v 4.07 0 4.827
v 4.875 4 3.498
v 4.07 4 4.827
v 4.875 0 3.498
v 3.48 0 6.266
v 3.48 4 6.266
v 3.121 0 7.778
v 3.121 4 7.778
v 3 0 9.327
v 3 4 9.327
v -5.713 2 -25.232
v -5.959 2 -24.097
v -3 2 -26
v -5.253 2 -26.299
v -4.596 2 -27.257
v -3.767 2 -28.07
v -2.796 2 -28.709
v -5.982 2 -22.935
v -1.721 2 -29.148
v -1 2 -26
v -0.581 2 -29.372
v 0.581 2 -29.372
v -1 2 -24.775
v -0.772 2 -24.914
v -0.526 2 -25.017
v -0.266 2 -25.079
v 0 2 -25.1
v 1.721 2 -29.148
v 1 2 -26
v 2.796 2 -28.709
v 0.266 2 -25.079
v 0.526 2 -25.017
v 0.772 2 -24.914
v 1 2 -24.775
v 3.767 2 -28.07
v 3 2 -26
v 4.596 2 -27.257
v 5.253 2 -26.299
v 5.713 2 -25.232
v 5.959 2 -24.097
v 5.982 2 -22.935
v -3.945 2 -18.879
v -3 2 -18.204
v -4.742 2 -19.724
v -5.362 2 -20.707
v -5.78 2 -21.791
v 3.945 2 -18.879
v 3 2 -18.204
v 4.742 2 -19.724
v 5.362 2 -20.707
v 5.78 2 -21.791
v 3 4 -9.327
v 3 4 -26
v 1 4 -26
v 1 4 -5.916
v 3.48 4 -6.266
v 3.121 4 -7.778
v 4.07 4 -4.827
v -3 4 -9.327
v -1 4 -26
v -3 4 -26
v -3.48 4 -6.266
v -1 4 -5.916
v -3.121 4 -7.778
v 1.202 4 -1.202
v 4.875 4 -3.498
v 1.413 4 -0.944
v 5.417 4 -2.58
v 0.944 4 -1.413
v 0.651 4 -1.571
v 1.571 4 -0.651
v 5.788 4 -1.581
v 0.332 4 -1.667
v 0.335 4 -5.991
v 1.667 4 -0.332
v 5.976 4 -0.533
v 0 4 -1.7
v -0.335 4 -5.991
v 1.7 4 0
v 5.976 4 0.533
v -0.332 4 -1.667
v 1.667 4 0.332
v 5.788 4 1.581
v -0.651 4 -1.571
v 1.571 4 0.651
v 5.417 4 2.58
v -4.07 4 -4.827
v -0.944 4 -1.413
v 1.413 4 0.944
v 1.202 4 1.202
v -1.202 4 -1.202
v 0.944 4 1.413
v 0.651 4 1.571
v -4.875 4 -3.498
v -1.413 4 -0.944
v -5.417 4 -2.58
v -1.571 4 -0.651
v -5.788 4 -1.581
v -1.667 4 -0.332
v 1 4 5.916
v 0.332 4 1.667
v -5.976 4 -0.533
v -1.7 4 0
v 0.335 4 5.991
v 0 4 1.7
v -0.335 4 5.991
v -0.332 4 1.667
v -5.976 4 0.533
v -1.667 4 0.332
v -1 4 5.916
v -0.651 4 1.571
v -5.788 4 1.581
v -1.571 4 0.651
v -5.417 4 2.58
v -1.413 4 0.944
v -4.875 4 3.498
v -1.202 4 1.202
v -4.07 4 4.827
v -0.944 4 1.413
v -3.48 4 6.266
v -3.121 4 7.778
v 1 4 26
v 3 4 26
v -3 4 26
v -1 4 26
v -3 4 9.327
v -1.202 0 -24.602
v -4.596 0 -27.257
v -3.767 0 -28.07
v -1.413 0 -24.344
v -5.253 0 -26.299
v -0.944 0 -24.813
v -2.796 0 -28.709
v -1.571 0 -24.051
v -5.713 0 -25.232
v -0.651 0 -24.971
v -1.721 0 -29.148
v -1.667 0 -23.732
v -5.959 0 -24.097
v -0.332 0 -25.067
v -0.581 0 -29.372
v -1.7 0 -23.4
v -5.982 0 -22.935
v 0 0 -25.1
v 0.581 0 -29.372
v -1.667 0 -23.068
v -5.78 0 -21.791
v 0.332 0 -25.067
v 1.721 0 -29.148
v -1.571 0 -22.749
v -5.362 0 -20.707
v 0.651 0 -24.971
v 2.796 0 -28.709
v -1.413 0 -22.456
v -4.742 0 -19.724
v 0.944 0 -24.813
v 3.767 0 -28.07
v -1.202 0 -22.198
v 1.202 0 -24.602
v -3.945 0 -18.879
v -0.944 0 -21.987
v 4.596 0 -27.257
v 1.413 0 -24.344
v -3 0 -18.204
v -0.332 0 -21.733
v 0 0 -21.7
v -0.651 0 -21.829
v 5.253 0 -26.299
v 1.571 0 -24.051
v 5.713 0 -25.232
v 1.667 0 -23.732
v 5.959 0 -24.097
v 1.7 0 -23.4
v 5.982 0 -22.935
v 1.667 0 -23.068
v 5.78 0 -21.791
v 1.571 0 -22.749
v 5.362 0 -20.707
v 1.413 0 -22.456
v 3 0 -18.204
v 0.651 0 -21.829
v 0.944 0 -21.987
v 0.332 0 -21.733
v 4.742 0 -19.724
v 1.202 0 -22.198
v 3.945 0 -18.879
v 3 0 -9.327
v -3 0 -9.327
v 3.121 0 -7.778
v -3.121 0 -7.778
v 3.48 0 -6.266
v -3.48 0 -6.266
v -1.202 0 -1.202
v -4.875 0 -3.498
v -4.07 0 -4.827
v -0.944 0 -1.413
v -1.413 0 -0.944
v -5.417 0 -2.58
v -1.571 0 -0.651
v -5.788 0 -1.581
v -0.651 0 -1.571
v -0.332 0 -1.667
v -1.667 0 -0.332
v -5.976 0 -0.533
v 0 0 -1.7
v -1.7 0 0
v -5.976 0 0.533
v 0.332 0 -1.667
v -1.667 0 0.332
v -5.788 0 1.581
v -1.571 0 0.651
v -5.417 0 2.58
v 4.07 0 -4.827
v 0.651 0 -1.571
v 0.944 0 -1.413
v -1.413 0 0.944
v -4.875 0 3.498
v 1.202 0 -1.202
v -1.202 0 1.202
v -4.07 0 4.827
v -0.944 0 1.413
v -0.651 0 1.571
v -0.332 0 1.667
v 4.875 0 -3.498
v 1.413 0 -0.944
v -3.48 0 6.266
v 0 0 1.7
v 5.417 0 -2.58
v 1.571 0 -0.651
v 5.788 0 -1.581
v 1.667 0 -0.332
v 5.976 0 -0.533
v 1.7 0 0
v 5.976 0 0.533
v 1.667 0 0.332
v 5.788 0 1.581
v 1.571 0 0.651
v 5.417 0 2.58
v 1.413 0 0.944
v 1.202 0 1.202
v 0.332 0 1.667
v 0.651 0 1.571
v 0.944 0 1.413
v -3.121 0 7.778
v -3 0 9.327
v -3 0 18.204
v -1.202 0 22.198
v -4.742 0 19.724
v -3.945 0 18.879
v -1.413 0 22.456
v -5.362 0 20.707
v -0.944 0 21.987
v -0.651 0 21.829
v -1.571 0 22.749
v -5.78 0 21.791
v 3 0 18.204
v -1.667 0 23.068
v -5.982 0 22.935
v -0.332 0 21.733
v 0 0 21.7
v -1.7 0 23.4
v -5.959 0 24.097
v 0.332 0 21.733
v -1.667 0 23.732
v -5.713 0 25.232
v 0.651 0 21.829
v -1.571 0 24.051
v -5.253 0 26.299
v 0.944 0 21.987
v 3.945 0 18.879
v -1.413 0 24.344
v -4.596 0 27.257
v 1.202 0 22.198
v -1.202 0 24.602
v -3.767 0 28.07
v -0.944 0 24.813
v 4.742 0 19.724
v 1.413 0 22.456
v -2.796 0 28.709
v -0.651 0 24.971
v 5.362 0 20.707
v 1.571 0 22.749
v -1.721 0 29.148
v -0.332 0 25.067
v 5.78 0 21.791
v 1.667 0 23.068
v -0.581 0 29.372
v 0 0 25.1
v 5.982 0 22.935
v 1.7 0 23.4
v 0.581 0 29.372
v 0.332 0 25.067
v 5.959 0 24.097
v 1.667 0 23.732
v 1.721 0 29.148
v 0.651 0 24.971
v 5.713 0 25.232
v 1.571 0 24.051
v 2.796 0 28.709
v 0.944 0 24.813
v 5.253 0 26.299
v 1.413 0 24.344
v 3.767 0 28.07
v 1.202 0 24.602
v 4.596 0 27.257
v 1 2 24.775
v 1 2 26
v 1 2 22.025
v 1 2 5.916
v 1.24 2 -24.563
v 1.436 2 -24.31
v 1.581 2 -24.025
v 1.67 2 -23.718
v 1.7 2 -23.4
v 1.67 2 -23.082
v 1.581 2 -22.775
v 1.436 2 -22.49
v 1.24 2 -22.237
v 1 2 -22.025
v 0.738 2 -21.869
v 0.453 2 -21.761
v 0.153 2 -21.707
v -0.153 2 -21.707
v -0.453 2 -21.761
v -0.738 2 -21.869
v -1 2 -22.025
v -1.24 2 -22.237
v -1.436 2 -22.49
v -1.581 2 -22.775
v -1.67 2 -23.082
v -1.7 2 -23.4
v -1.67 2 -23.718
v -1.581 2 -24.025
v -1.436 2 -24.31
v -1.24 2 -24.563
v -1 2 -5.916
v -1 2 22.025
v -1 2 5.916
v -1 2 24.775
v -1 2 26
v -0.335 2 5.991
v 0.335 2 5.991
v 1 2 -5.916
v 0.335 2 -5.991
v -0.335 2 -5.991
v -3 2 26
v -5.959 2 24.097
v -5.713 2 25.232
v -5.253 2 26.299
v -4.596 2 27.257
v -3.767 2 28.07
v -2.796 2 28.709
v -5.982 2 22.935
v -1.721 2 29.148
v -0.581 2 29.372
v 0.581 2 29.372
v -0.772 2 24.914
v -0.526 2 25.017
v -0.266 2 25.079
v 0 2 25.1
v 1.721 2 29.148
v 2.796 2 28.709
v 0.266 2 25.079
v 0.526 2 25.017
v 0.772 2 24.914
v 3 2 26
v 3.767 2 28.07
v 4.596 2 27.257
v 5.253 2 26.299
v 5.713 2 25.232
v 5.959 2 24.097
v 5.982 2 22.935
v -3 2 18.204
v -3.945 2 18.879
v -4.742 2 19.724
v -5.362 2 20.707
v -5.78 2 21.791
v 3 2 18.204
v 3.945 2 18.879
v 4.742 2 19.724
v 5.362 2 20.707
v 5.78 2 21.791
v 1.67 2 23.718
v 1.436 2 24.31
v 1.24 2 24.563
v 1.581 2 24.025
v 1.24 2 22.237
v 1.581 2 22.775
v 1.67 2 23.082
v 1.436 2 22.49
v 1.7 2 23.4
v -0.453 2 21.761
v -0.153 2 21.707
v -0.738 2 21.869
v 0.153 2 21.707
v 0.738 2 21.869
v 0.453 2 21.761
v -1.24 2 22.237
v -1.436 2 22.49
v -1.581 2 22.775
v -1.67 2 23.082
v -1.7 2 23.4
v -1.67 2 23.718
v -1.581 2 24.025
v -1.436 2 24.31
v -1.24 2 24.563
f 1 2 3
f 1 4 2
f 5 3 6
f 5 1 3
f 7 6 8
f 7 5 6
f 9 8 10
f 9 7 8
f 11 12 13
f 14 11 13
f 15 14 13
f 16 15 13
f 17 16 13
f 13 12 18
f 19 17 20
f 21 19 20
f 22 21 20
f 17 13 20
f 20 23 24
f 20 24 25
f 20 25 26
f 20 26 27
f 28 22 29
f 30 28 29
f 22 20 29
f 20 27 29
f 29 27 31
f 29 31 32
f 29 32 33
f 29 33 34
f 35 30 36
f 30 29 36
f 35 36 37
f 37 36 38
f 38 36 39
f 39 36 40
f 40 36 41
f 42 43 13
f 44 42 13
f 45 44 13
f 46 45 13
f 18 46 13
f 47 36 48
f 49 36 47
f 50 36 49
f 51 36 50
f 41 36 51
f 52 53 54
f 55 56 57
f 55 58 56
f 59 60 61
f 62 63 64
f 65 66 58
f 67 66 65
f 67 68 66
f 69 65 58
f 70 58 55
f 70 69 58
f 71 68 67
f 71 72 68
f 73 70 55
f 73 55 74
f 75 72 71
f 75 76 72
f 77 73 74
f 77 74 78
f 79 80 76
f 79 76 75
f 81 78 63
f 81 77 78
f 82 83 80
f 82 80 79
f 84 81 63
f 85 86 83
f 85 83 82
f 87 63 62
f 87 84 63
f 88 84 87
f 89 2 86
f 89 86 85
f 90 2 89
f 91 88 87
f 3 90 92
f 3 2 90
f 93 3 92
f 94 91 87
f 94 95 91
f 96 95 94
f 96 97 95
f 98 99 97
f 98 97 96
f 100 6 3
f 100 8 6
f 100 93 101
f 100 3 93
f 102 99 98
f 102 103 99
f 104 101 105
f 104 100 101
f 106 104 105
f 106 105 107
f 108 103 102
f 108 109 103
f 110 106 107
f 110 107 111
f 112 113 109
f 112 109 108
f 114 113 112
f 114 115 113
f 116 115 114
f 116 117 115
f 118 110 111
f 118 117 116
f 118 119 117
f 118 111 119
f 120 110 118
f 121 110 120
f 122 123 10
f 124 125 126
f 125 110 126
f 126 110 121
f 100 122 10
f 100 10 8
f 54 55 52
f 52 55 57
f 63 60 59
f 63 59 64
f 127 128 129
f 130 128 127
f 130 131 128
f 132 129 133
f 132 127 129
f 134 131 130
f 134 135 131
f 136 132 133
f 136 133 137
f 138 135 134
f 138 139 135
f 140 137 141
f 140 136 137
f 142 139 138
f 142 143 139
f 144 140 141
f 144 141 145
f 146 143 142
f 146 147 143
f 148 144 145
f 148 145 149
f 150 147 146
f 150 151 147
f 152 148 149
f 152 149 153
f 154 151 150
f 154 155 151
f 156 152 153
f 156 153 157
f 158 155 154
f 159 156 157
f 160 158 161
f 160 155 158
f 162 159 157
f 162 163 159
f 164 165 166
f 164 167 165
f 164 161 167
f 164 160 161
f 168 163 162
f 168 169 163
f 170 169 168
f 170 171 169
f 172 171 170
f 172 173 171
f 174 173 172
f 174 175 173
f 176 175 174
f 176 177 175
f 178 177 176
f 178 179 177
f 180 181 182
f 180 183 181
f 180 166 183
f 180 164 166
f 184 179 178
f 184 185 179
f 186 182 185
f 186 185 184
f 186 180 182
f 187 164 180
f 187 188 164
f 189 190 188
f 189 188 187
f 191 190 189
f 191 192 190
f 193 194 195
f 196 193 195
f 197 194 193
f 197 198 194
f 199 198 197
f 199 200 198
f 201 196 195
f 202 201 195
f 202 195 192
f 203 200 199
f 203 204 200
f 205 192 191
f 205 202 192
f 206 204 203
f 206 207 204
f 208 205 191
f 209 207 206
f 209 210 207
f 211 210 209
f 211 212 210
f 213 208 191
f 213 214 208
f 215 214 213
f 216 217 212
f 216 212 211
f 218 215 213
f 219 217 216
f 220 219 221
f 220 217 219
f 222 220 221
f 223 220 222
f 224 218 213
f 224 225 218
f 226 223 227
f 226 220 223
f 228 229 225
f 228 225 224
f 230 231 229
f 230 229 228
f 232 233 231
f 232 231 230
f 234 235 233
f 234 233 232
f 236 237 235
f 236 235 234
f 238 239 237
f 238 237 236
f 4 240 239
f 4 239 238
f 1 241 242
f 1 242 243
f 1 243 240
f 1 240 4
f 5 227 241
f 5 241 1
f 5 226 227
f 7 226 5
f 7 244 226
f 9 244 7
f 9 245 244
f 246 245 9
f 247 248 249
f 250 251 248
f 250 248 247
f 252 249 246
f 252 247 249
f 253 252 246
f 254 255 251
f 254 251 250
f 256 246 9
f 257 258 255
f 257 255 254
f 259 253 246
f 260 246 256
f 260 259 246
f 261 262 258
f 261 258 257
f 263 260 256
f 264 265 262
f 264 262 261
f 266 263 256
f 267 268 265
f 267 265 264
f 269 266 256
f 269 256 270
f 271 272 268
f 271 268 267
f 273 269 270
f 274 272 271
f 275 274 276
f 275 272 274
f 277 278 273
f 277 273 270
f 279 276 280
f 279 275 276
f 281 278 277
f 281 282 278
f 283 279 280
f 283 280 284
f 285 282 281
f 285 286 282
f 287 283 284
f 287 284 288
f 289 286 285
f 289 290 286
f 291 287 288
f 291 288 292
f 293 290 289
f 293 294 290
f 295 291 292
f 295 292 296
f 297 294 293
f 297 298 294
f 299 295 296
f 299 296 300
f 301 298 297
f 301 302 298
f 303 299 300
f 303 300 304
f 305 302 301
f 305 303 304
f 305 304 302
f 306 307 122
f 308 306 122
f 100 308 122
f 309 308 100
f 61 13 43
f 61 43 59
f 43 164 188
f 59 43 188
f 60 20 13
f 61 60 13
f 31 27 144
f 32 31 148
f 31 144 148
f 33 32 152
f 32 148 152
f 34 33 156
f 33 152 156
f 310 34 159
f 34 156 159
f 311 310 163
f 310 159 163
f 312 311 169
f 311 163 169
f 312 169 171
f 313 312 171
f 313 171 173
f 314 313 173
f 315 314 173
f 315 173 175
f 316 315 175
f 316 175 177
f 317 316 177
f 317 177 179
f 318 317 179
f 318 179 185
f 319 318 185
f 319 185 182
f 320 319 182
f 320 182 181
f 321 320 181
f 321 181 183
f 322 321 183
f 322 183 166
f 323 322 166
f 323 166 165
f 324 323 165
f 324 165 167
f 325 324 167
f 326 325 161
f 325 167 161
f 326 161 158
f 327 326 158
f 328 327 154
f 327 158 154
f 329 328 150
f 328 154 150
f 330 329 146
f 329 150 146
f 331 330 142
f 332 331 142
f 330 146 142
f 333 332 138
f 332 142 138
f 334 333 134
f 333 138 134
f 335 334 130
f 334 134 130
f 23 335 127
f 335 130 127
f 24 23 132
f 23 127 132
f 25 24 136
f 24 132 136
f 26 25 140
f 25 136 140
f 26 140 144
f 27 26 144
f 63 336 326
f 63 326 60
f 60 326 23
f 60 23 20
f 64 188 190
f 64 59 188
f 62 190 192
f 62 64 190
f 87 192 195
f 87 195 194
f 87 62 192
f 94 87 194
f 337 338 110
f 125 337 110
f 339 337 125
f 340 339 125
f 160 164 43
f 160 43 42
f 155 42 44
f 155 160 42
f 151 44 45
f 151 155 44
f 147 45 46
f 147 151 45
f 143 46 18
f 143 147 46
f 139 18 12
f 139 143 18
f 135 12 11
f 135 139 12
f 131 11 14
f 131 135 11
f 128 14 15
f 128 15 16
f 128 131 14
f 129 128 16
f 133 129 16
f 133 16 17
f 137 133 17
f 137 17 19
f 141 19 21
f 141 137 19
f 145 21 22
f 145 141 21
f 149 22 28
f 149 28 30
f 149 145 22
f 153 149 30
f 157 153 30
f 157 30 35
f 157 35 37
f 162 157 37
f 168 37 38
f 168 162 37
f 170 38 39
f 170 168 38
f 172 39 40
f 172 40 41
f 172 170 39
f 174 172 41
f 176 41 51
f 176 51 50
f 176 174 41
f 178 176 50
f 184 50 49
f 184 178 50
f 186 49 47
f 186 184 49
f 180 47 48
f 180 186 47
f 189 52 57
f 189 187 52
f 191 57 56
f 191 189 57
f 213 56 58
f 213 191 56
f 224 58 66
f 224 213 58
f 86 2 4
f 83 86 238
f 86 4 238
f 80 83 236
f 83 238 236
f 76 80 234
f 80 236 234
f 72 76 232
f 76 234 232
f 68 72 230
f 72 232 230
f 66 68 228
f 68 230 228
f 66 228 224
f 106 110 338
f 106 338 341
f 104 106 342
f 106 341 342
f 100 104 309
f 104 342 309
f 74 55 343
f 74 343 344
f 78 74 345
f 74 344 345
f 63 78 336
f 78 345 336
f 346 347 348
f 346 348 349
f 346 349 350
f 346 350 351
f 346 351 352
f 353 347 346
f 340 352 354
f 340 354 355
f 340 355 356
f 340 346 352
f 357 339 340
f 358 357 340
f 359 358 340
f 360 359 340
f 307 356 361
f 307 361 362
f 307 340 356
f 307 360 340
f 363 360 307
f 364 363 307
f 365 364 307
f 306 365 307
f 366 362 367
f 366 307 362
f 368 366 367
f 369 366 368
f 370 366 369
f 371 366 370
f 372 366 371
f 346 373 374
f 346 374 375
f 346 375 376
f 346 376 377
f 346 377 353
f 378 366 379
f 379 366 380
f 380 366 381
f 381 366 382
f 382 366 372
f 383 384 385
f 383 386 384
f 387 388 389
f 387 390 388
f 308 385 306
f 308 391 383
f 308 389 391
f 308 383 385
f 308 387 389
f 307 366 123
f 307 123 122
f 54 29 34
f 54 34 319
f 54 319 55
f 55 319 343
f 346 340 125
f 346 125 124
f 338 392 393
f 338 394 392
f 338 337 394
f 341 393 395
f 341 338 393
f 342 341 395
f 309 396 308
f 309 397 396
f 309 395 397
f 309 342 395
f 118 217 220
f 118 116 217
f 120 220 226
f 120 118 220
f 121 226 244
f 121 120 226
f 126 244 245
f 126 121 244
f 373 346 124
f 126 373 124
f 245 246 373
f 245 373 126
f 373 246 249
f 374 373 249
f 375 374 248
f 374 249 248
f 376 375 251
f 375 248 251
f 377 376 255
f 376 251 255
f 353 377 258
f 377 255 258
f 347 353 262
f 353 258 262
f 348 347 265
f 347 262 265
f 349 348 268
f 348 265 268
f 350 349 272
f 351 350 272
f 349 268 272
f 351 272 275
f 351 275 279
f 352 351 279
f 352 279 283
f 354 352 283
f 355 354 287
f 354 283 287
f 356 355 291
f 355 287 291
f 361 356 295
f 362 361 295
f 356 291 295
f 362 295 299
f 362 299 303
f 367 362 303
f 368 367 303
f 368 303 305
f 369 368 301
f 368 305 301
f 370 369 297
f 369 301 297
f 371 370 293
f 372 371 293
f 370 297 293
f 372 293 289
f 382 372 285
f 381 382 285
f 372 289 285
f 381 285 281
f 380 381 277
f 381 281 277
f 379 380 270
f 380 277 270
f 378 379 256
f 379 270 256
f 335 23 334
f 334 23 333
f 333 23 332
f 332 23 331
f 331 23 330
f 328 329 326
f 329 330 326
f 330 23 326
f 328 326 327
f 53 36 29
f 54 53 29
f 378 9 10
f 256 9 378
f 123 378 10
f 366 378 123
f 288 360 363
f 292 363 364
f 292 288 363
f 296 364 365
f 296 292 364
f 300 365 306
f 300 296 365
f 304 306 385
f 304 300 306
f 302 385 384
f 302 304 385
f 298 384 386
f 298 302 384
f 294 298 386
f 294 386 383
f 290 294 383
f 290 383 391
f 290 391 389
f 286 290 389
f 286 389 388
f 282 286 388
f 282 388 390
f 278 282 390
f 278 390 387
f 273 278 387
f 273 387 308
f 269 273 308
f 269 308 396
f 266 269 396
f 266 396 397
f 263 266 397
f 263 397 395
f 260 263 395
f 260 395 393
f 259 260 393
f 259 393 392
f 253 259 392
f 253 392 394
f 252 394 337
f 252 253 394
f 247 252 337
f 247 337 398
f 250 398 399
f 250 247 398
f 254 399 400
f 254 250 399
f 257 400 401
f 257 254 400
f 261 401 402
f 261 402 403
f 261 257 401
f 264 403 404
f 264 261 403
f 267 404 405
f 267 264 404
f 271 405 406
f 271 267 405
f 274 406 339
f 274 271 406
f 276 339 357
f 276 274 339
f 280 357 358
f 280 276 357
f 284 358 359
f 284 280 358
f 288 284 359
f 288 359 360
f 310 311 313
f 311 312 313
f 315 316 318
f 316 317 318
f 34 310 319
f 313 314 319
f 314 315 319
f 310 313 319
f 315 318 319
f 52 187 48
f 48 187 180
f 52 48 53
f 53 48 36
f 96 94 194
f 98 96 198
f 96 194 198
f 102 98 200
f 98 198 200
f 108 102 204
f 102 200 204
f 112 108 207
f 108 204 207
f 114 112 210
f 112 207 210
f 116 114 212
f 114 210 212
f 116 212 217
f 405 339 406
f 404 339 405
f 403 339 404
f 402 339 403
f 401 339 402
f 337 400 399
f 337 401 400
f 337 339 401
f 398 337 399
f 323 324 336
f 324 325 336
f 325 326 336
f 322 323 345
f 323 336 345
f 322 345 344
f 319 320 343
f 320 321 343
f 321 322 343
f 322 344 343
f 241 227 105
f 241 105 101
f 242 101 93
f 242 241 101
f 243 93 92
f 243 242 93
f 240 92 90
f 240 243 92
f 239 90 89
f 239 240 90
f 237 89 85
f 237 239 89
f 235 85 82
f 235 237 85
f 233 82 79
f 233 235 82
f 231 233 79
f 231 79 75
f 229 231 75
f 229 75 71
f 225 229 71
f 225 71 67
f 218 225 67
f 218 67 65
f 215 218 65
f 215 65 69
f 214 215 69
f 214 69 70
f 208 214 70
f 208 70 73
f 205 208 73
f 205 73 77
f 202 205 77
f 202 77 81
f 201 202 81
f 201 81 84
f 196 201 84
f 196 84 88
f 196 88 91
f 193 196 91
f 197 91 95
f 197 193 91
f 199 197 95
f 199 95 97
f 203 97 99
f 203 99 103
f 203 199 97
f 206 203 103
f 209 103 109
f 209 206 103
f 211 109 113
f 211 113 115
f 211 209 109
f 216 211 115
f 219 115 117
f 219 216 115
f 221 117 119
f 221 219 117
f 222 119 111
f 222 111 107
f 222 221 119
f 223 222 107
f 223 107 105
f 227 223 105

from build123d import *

# Parameters (mm, degrees)
SKETCH1_R           = 1.6999999999999986
SKETCH1_R_2         = 1.7
BOSS_EXTRUDE1_DEPTH = 2
BOSS_EXTRUDE2_DEPTH = 2
SKETCH3_R           = 6.000000000000001
SKETCH3_R_2         = 1.7
BOSS_EXTRUDE3_DEPTH = 2
FILLET1_R           = 10
FILLET2_R           = 10


with BuildPart() as part:
    # Sketch1 → Boss-Extrude1 (new body)
    with BuildSketch(Plane(origin=(0, 0, 0), x_dir=(1, 0, 0), z_dir=(0, 1, 0))):
        with BuildLine():
            Line((-2.999999999999997, -5.196152422706636), (-2.9999999999999973, -18.20384757729328))
            ThreePointArc((-2.9999999999999045, -18.203847577293313), (-2.417e-14, -29.400000000000006), (2.9999999999999534, -18.20384757729334))
            Line((3.0000000000000027, -18.20384757729332), (3.000000000000003, -5.196152422706632))
            ThreePointArc((3.0000000000000027, -5.196152422706631), (-3.11e-15, 6), (-2.9999999999999973, -5.196152422706634))
        make_face()
        with Locations(Location((-5e-16, -23.400000000000002, 0), (0, 0, 270))):
            Circle(SKETCH1_R, mode=Mode.SUBTRACT)
        with Locations(Location((0, 0, 0), (0, 0, 270))):
            Circle(SKETCH1_R_2, mode=Mode.SUBTRACT)
    boss_extrude1 = extrude(amount=BOSS_EXTRUDE1_DEPTH)

    # Sketch2 → Boss-Extrude2 (add)
    with BuildSketch(Plane(origin=(0, 2, 0), x_dir=(1, 0, 0), z_dir=(0, 1, 0))):
        Polygon((-2.999999999999997, -26.000000000000004), (-2.9999999999999964, -5.196152422706635), (-0.9999999999999996, -5.196152422706635), (-0.999999999999997, -26.000000000000004), align=None)
        Polygon((3.000000000000003, -26.000000000000004), (1.000000000000003, -26.000000000000004), (1.000000000000003, -5.196152422706631), (3.0000000000000027, -5.196152422706631), align=None)
    boss_extrude2 = extrude(amount=BOSS_EXTRUDE2_DEPTH)

    # Sketch3 → Boss-Extrude3 (add)
    with BuildSketch(Plane(origin=(0, 2, 0), x_dir=(1, 0, 0), z_dir=(0, 1, 0))):
        Circle(SKETCH3_R)
        with Locations(Location((0, 0, 0), (0, 0, 270))):
            Circle(SKETCH3_R_2, mode=Mode.SUBTRACT)
    extrude(amount=BOSS_EXTRUDE3_DEPTH)

    # Fillet1
    fillet1_edges = [part.edges().sort_by_distance(p)[0] for p in [
        (-2.999999999999997, 2, 5.196152422706636),
        (3.0000000000000027, 2, 5.196152422706631),
    ]]
    fillet(fillet1_edges, radius=FILLET1_R)

    # Mirror1: Boss-Extrude1, Boss-Extrude2 across plane
    add(boss_extrude1.mirror(Plane.XY))
    add(boss_extrude2.mirror(Plane.XY))

    # Fillet2
    fillet2_edges = [part.edges().sort_by_distance(p)[0] for p in [
        (3.0000000000000027, 2, -5.196152422706631),
        (-2.999999999999997, 2, -5.196152422706636),
    ]]
    fillet(fillet2_edges, radius=FILLET2_R)


solid = part.part
